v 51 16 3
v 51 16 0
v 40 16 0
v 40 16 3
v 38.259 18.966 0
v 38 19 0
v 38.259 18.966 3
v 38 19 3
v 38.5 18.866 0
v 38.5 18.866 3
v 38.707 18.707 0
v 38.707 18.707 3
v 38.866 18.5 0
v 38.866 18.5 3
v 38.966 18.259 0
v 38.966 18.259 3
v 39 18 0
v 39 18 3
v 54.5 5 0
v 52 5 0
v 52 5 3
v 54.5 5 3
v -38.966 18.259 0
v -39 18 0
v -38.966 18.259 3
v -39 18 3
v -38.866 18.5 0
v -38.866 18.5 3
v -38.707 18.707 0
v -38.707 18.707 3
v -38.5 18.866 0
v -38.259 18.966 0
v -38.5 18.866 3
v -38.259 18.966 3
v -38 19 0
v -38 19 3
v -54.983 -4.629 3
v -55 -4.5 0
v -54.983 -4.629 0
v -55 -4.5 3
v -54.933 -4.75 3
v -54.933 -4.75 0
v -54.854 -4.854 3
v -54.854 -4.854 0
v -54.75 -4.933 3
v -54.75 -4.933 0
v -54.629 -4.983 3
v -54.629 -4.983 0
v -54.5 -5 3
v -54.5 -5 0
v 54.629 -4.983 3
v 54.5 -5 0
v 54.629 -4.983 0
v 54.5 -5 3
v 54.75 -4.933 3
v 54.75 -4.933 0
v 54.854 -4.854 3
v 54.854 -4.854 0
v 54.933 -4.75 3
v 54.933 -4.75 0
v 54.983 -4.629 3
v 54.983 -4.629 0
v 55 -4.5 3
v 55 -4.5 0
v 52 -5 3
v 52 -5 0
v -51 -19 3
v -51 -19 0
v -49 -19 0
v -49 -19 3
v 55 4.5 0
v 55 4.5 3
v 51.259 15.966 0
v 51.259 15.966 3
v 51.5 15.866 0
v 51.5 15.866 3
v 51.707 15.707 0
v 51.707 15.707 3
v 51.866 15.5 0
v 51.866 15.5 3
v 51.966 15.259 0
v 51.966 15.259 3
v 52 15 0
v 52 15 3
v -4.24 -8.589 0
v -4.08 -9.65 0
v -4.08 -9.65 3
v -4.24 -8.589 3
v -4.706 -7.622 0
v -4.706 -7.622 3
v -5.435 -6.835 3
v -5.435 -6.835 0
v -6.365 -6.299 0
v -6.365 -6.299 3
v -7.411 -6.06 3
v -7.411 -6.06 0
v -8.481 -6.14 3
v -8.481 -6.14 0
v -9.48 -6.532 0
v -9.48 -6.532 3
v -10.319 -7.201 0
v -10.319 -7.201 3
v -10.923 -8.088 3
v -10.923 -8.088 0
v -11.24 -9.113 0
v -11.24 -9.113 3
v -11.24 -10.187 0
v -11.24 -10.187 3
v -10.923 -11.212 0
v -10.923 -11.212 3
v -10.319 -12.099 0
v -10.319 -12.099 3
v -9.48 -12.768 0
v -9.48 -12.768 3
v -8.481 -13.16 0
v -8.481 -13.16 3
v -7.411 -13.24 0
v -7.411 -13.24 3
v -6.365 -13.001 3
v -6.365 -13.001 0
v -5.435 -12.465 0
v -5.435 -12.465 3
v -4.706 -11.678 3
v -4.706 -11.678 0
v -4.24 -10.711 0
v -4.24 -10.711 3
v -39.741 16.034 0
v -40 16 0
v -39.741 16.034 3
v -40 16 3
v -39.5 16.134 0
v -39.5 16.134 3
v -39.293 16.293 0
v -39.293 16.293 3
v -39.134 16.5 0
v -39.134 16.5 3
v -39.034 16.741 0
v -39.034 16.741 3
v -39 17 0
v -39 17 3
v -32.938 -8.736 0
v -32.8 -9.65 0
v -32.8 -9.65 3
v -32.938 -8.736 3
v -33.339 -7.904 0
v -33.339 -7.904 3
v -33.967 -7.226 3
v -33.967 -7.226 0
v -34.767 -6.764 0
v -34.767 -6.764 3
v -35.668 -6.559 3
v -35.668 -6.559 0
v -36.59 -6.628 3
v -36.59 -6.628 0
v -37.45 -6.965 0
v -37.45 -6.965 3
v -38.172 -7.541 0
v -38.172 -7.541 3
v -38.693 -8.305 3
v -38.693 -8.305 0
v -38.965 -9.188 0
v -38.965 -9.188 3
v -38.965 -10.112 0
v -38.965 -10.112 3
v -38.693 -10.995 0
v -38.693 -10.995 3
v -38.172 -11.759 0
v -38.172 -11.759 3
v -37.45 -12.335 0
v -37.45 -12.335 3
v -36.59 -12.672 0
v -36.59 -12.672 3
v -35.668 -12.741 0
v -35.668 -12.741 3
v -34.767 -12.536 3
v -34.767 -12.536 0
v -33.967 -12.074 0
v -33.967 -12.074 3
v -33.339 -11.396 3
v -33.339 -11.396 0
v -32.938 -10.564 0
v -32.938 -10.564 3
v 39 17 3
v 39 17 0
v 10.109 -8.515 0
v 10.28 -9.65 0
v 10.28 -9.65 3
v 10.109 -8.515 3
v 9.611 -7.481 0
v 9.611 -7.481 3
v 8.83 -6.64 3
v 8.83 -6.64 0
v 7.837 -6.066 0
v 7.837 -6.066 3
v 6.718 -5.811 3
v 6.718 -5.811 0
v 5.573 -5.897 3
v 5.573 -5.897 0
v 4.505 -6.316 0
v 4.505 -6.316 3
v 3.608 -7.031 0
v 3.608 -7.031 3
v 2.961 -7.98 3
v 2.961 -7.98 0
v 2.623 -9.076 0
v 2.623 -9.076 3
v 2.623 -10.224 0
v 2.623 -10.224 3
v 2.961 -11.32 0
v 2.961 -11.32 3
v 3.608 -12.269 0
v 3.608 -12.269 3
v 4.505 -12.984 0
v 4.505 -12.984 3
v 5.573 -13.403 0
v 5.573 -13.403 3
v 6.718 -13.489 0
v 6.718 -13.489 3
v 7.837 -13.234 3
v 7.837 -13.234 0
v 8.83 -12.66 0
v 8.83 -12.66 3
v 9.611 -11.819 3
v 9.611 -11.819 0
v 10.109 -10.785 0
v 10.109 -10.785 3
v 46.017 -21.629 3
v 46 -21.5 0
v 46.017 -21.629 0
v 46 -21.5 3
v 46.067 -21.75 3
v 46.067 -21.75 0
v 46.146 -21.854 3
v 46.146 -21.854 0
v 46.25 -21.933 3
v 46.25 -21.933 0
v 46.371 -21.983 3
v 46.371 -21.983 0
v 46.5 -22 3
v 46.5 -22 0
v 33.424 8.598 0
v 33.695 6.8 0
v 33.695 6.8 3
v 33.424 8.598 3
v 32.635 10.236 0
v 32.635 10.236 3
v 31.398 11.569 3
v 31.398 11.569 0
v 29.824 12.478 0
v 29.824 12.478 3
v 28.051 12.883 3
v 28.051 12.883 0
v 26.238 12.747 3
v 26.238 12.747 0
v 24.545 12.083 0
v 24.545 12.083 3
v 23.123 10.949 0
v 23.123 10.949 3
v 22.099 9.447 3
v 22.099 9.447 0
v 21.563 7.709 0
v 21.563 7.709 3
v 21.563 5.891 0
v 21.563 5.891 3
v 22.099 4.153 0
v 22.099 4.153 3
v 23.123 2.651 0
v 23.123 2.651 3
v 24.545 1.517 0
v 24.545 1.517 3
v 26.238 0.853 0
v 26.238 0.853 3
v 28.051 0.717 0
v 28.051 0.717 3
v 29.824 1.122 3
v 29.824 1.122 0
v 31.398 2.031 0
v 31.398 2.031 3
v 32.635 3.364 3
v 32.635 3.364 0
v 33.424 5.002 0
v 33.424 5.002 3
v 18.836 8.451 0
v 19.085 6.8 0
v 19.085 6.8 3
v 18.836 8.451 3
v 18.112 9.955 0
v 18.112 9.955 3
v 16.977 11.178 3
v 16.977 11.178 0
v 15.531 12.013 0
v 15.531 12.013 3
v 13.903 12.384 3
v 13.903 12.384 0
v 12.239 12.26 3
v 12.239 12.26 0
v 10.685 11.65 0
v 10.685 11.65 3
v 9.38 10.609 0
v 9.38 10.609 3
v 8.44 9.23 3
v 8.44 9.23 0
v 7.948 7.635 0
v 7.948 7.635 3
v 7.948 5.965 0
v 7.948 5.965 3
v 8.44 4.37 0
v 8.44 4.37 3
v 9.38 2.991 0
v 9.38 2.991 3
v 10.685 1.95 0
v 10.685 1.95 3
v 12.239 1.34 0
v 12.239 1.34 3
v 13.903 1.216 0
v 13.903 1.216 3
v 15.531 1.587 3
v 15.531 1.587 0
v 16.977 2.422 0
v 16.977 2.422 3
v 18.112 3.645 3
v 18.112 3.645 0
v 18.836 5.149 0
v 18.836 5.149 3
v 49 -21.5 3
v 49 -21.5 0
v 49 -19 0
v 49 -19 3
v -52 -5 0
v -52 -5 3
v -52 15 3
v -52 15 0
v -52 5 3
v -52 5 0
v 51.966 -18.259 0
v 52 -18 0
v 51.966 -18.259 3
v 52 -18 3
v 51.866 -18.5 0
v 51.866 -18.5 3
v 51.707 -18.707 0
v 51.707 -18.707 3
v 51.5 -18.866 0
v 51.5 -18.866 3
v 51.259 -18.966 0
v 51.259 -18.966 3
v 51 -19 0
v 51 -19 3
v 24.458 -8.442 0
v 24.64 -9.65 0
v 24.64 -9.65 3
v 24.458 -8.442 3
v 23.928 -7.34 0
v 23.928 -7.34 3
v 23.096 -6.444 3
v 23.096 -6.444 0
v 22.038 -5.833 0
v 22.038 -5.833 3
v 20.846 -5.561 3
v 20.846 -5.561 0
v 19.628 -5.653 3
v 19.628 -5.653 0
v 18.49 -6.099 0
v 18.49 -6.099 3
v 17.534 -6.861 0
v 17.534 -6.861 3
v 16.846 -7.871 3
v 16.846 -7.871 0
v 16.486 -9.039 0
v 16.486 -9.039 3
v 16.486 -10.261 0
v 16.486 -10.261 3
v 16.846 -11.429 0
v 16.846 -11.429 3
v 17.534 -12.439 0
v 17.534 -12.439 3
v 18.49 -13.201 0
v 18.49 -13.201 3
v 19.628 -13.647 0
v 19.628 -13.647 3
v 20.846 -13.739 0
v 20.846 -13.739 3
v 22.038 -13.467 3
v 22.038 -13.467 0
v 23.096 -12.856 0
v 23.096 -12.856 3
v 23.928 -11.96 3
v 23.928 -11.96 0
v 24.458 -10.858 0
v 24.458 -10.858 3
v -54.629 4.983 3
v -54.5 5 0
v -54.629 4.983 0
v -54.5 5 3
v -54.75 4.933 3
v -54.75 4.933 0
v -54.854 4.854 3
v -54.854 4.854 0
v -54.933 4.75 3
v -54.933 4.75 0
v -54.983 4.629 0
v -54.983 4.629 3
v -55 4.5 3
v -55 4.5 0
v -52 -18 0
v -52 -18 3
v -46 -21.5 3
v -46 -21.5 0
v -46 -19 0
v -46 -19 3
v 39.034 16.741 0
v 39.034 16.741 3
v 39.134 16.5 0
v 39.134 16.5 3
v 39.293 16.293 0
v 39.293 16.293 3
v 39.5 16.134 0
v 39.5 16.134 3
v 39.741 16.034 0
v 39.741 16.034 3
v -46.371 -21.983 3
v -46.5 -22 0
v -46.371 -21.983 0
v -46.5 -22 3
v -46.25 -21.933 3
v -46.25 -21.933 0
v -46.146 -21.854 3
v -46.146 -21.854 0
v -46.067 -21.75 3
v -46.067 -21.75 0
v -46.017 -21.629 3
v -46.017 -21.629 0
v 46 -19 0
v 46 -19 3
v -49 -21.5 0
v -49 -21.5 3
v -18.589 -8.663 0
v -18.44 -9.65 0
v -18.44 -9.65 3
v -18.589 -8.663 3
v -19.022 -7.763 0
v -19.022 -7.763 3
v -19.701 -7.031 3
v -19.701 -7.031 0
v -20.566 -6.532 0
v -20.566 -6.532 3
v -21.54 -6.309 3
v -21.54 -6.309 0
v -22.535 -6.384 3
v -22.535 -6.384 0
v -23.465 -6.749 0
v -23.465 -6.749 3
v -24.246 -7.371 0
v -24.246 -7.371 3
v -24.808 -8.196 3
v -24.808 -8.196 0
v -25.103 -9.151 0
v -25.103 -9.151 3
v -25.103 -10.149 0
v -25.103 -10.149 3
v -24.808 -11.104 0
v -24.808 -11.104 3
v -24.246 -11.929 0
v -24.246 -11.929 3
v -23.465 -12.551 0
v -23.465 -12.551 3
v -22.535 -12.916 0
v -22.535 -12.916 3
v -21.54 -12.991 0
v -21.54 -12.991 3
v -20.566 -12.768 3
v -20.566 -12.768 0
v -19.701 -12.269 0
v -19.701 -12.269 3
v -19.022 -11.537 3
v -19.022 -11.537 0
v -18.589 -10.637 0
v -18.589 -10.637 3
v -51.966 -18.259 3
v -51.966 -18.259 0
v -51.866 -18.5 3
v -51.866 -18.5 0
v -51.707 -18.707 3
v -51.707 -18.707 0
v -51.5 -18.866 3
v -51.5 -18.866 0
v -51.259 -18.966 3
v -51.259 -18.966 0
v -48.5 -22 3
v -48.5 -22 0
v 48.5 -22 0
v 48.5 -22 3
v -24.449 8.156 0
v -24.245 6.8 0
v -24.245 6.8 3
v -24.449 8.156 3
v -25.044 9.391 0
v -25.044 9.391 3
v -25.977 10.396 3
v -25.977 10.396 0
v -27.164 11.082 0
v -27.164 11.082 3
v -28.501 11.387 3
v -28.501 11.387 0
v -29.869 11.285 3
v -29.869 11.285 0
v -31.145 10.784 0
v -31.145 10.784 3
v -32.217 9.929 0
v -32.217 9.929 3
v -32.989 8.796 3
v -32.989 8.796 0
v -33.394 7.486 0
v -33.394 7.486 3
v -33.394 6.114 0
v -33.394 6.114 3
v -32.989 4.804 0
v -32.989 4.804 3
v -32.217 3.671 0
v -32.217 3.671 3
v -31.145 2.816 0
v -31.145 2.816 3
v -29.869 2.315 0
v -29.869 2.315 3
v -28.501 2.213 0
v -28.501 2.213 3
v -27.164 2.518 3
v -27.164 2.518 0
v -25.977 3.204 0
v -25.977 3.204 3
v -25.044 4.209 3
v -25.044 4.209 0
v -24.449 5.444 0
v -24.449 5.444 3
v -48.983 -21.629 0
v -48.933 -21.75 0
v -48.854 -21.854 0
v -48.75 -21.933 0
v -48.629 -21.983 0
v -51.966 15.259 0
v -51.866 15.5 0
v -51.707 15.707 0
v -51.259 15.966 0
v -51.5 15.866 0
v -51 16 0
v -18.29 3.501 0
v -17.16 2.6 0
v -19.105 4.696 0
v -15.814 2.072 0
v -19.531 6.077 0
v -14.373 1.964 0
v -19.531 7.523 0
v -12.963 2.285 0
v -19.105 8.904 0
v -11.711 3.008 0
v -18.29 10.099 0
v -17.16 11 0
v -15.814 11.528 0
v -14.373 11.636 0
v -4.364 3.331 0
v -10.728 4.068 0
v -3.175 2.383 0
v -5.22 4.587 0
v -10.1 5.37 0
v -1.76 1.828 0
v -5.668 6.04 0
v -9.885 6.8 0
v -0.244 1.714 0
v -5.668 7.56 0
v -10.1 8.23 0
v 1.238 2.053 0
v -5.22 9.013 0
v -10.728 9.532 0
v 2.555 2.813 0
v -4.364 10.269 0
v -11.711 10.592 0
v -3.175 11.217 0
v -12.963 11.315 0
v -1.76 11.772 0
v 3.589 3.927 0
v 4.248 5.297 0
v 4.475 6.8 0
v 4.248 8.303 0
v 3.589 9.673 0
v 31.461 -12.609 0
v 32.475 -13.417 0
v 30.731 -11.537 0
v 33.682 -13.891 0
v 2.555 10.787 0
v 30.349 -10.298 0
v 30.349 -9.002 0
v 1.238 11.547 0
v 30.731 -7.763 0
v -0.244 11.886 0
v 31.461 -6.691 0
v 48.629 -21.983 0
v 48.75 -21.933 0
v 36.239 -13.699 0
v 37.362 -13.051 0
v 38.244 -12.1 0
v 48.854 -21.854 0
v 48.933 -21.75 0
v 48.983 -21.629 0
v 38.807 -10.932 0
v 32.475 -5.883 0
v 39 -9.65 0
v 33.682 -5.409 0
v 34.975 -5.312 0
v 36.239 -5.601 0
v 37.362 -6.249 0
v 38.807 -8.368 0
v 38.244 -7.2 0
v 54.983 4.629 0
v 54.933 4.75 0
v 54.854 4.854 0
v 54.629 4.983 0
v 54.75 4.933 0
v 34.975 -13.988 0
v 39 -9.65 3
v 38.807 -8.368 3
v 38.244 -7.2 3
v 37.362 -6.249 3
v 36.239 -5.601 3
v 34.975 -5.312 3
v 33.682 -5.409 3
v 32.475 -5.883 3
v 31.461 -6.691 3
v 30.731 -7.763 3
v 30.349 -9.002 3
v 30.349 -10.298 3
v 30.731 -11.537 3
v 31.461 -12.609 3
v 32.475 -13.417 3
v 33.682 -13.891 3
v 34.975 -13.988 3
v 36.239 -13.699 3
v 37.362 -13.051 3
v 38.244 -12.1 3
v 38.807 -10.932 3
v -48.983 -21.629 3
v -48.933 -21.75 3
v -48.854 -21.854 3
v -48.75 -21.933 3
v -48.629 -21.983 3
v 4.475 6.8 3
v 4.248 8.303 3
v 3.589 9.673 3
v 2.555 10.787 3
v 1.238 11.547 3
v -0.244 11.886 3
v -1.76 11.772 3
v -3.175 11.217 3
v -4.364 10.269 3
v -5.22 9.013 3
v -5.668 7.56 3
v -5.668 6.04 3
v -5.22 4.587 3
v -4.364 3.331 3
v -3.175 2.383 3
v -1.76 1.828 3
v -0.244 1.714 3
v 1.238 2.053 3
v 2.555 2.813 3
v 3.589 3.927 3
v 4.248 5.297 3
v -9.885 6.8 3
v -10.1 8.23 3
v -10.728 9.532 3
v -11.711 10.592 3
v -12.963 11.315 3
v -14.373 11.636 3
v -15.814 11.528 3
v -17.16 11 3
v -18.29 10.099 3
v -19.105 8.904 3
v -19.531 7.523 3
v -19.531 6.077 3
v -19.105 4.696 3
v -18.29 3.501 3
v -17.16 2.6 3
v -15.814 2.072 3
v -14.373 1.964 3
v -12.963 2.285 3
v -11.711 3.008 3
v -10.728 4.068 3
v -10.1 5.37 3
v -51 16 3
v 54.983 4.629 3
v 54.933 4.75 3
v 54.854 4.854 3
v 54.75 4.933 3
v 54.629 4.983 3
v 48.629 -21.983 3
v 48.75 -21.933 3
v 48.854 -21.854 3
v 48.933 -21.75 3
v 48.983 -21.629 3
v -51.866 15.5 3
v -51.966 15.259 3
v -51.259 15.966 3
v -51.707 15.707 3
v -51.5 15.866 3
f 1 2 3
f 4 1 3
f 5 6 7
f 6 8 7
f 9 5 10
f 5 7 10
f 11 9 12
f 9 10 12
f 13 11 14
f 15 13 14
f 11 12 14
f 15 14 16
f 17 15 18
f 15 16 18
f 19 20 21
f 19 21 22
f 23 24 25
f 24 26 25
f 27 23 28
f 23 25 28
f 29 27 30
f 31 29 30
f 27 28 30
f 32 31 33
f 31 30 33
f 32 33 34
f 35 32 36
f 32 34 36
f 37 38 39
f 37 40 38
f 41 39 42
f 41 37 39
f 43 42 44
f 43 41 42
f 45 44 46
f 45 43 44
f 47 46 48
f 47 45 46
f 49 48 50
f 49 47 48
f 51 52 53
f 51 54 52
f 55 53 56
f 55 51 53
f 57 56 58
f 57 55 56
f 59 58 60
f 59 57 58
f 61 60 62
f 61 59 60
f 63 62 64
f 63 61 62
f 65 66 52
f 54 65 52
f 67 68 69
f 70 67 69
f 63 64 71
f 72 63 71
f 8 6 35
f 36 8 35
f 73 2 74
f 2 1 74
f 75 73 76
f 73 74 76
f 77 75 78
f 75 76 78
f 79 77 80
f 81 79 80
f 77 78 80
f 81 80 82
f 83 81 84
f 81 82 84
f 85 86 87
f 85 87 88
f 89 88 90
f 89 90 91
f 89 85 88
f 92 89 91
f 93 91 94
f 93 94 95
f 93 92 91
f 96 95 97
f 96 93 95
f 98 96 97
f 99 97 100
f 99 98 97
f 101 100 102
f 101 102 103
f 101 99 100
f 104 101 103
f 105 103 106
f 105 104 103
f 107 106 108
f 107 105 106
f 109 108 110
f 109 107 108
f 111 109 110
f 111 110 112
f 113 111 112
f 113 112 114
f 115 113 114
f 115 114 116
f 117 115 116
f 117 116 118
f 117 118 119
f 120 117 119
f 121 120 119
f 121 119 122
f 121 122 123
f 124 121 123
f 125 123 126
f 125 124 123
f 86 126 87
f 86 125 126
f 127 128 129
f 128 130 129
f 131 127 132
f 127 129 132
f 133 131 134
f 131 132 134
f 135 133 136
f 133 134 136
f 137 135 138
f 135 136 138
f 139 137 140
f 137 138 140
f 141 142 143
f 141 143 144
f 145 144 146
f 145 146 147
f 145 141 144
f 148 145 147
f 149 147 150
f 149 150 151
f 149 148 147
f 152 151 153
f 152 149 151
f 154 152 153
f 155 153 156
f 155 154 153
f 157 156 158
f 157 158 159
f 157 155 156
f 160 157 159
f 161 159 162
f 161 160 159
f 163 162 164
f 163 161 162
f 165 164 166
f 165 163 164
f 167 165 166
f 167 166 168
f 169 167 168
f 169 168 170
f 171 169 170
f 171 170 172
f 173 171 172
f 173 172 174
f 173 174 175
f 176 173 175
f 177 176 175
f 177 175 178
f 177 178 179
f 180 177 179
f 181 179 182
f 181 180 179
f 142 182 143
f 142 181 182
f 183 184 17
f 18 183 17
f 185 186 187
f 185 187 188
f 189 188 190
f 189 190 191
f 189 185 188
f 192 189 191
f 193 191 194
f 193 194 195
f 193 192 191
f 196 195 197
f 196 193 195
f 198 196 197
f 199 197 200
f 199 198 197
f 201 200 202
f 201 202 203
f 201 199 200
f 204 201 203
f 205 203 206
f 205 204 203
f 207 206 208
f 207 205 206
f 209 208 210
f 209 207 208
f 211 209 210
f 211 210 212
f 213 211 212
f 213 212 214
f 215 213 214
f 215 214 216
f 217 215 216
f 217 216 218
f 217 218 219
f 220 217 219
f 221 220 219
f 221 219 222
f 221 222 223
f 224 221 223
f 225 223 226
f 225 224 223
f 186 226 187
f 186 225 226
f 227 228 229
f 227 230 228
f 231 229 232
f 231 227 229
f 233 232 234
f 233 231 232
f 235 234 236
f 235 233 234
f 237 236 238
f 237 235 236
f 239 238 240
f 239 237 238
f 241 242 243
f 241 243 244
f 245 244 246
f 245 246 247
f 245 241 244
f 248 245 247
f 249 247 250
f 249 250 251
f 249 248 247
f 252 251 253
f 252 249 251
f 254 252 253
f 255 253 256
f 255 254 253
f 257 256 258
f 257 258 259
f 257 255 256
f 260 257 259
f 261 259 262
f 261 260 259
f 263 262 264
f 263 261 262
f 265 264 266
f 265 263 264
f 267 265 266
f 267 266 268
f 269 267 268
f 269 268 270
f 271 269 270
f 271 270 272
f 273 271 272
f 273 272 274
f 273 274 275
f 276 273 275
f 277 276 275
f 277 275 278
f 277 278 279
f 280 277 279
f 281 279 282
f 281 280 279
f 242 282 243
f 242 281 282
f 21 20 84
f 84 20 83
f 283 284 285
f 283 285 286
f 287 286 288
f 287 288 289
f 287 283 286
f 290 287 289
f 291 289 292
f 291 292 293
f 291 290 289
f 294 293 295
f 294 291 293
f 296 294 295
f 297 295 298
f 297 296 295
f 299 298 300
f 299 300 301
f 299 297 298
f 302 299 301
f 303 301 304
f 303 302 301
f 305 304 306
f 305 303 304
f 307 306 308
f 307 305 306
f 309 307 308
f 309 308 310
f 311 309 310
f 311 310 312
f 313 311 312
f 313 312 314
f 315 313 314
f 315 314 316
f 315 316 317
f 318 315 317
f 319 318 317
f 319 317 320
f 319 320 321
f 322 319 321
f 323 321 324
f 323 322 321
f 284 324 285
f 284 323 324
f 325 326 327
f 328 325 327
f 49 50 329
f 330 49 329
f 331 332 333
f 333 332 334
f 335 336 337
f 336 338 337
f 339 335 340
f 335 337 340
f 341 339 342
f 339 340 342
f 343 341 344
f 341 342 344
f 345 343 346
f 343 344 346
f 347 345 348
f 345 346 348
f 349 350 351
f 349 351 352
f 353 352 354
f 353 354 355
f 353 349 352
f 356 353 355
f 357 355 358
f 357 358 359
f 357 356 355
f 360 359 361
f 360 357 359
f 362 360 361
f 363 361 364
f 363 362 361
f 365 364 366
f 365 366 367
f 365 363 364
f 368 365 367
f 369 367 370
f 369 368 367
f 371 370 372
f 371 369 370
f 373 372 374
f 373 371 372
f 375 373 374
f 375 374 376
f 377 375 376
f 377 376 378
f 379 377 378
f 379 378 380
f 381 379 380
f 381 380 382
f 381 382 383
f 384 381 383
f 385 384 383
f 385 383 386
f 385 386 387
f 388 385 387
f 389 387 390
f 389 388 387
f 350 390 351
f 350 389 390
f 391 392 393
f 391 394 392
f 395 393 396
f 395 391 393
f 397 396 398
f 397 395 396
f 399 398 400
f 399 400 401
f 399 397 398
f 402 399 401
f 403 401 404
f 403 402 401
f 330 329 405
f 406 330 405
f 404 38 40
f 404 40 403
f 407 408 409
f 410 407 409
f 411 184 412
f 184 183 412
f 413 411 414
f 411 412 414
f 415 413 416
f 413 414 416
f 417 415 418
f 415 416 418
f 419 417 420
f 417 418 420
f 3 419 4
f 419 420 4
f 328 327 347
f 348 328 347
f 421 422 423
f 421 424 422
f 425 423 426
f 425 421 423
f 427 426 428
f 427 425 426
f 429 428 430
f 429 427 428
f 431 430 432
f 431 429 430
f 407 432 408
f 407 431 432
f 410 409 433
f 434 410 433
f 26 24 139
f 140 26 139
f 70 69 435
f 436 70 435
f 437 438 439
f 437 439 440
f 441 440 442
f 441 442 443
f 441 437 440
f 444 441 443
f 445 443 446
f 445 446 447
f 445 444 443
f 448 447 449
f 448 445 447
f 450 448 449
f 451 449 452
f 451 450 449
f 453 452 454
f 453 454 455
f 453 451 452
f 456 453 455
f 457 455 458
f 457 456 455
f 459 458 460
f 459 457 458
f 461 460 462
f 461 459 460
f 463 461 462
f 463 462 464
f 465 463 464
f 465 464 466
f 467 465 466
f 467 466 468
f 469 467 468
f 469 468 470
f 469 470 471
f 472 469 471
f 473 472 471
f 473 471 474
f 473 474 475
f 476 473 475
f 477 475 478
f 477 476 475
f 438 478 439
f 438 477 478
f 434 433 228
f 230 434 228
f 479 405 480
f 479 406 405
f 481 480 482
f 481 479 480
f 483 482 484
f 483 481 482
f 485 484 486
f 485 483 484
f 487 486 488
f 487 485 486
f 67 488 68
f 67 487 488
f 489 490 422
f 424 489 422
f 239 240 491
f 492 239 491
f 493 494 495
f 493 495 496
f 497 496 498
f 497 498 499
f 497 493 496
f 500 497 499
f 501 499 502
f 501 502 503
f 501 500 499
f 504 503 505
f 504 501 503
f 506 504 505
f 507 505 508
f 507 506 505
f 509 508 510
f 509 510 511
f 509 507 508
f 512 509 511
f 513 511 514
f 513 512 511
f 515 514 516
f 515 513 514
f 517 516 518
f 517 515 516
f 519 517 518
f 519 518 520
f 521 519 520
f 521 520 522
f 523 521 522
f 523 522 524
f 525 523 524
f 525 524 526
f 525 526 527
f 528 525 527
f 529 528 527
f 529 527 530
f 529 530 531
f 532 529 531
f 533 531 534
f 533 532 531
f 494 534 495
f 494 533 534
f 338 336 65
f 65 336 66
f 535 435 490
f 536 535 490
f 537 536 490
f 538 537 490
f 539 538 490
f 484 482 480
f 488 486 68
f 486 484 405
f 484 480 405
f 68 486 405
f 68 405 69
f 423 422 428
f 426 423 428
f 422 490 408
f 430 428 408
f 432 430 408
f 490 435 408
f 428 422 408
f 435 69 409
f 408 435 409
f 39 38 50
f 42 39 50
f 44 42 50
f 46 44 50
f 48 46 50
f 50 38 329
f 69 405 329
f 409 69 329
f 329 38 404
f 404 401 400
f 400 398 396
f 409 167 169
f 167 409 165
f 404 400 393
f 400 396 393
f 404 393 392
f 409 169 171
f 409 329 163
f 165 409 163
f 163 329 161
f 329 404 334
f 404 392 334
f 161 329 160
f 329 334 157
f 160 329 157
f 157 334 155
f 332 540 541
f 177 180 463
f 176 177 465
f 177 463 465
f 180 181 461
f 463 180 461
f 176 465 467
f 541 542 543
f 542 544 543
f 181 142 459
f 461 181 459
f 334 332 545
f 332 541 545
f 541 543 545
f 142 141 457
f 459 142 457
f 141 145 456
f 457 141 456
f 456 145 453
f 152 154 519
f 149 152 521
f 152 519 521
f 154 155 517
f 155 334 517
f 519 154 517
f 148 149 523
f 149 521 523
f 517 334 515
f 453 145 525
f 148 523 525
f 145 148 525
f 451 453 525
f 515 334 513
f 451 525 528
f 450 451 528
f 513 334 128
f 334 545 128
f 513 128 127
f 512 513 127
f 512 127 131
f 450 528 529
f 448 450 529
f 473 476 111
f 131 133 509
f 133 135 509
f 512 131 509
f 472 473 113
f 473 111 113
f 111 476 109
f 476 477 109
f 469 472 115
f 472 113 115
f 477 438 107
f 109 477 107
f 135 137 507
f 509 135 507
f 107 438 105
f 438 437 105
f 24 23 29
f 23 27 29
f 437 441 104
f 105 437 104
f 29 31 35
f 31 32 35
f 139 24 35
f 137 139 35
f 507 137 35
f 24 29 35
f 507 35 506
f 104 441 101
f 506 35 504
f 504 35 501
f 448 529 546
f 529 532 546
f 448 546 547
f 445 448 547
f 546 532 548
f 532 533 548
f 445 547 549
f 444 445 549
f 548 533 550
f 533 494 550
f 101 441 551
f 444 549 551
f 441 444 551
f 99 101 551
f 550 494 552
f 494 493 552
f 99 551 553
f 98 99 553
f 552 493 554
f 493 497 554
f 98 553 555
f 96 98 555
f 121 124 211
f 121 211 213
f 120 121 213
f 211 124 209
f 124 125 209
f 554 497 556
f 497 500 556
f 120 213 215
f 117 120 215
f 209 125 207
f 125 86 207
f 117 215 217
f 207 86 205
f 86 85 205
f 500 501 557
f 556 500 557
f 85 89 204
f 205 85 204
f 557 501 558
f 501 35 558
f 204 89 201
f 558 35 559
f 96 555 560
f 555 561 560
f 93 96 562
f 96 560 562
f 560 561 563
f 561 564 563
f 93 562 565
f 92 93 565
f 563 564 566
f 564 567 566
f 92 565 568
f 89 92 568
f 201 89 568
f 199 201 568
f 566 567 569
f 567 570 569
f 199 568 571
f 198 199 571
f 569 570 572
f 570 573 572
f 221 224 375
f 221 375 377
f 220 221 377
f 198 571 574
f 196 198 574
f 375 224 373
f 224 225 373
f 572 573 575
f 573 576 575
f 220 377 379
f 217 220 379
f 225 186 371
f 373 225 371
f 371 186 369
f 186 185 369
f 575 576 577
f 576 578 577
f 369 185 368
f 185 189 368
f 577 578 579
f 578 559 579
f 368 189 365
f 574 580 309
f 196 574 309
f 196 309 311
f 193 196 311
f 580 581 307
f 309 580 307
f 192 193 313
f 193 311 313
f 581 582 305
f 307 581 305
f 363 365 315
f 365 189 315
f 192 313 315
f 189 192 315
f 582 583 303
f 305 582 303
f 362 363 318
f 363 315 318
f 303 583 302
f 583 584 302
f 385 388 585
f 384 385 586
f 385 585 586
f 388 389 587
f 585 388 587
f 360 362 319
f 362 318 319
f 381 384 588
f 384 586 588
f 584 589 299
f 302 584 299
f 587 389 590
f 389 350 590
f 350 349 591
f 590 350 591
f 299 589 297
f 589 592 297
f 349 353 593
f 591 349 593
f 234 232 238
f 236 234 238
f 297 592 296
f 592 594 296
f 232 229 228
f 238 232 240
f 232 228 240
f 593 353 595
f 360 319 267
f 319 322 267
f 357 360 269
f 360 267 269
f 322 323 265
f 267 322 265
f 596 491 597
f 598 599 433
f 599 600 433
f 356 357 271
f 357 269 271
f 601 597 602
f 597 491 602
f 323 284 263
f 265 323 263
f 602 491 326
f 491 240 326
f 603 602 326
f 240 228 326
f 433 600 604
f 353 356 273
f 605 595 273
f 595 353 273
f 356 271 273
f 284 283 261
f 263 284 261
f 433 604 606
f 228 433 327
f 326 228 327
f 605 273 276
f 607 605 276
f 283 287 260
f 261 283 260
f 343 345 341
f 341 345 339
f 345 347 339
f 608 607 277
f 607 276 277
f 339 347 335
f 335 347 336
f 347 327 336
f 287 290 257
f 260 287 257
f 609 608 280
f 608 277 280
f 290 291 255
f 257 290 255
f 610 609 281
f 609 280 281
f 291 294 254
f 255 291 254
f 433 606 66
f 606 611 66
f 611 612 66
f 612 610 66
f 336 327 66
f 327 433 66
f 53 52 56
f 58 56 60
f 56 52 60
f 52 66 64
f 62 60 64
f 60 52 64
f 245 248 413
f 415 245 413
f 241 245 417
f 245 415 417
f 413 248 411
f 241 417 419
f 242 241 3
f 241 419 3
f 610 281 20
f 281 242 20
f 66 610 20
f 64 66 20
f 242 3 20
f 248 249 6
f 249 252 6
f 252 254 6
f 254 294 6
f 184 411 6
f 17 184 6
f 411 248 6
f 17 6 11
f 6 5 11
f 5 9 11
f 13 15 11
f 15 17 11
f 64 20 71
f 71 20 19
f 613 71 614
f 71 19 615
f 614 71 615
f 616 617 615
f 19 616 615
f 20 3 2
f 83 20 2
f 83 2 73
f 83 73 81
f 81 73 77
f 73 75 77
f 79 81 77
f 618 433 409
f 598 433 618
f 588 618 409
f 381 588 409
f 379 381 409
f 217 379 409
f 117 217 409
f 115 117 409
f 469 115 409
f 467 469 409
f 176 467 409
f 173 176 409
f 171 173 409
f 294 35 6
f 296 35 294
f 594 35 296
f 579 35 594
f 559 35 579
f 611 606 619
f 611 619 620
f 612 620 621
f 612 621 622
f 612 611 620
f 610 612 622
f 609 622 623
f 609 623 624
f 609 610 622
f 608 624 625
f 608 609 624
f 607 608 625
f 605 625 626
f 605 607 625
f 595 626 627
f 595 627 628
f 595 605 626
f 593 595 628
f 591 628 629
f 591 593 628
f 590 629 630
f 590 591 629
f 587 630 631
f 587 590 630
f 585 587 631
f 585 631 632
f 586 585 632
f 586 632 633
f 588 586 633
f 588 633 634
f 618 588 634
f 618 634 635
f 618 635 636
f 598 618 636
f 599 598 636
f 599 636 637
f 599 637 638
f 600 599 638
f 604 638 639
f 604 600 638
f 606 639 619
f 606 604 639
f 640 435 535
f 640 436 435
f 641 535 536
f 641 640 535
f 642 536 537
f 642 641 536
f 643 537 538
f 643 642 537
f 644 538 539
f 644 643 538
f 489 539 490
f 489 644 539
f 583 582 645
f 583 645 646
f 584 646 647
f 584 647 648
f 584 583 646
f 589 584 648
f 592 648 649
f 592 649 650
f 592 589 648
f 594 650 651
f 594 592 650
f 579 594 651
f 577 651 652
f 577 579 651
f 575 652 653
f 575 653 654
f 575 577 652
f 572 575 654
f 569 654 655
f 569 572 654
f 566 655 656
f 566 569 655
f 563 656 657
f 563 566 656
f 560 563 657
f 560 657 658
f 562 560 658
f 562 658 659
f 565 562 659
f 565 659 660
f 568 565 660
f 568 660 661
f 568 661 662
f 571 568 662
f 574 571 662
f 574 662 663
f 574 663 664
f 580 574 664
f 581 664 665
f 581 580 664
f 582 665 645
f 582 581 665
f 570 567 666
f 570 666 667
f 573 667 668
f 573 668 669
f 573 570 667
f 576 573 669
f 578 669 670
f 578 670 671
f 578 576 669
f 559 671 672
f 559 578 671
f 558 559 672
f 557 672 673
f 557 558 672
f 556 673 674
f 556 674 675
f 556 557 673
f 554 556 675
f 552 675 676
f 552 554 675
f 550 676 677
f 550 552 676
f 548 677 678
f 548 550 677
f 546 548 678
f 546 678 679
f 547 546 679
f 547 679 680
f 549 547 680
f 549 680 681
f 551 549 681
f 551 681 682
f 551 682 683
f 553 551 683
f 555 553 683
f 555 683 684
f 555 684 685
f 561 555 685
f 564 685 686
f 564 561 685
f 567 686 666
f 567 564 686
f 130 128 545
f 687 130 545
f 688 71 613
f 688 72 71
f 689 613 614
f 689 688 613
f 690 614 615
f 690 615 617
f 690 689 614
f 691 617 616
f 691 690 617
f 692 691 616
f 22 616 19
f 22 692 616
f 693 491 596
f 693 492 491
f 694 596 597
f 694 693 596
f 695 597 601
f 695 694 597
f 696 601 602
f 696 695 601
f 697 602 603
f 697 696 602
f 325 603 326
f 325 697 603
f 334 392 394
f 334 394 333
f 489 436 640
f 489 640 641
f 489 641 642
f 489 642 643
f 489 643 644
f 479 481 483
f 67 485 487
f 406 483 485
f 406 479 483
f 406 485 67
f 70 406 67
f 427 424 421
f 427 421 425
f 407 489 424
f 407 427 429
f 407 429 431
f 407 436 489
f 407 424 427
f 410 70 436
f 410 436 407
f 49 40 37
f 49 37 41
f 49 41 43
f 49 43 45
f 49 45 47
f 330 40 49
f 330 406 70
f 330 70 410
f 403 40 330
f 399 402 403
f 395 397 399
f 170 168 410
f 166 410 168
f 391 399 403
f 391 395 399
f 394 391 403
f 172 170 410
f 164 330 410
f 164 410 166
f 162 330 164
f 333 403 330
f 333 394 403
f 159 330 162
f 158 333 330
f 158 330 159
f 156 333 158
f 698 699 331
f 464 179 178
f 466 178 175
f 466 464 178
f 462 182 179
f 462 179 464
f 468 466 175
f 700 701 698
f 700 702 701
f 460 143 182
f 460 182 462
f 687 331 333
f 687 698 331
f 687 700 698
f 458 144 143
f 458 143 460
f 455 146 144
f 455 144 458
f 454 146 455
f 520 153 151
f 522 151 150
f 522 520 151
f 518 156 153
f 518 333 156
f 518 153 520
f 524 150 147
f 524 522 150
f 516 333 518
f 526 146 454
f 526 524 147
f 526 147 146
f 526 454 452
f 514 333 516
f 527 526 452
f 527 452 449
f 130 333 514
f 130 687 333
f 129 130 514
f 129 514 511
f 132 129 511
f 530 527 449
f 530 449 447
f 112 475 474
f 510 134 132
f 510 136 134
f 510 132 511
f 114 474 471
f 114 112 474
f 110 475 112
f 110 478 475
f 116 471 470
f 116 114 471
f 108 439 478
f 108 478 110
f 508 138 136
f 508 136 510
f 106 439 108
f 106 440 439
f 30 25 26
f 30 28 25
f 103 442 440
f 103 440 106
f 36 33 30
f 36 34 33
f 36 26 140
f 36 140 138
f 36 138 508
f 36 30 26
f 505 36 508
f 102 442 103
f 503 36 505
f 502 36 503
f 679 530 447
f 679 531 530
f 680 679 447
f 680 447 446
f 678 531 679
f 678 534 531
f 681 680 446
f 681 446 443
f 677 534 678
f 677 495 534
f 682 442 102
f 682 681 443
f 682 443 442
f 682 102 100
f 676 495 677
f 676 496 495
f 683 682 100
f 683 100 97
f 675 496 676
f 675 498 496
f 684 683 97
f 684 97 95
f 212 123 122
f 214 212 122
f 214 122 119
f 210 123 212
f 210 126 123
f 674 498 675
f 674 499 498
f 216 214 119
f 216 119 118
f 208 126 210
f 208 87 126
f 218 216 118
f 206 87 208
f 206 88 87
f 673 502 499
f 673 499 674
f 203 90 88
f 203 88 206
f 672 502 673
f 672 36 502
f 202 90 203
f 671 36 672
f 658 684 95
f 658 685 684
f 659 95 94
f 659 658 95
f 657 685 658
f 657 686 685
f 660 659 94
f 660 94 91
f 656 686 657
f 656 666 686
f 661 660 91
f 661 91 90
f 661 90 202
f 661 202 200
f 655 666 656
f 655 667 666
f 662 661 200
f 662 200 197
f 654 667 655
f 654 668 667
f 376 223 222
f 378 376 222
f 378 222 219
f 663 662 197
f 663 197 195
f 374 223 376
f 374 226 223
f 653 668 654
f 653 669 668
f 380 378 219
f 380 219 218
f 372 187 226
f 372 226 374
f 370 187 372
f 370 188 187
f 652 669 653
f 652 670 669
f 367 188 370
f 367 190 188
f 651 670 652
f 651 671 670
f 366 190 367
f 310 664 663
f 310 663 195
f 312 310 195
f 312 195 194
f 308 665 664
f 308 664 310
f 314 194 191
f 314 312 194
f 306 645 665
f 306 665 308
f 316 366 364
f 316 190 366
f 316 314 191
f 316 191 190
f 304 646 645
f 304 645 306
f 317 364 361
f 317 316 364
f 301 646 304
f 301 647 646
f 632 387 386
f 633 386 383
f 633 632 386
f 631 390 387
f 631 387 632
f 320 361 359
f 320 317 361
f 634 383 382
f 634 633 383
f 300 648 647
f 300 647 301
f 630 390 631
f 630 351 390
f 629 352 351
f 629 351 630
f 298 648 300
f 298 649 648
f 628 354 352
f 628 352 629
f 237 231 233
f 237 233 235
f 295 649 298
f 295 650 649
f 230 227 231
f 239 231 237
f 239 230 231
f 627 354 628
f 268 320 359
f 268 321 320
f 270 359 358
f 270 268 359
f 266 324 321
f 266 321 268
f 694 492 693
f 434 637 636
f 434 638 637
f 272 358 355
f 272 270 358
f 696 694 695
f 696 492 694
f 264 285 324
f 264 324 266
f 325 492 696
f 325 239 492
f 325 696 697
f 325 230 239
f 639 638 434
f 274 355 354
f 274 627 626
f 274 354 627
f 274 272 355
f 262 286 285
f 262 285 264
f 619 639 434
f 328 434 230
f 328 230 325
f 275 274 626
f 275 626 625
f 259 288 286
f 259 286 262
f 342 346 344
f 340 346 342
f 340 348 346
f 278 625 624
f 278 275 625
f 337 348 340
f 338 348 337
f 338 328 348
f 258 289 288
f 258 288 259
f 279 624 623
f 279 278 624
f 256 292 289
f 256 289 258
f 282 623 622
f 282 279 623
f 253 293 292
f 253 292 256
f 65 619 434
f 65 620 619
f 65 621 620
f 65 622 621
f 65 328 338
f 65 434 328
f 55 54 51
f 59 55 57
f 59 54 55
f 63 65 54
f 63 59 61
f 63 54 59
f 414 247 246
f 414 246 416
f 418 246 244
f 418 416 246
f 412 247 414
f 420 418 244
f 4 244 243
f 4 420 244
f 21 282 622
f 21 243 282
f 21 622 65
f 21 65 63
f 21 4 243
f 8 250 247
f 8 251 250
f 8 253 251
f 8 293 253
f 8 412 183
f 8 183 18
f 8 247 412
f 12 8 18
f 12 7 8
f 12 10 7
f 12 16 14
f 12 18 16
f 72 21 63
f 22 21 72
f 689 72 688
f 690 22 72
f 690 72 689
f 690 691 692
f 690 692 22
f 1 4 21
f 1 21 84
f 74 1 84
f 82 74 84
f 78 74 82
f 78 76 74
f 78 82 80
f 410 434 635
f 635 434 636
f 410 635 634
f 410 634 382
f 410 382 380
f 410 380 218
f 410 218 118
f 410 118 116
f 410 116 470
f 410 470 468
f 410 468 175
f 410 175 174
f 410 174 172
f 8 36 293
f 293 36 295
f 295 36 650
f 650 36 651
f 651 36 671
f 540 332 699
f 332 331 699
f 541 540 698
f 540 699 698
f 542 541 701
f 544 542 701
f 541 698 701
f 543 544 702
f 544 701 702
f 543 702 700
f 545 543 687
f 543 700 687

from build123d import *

# Parameters (mm, degrees)
SKETCH_1_R      = 3.1
SKETCH_1_R_2    = 3.35
SKETCH_1_R_3    = 3.6
SKETCH_1_R_4    = 3.85
SKETCH_1_R_5    = 4.1
SKETCH_1_R_6    = 4.35
SKETCH_1_R_7    = 4.6
SKETCH_1_R_8    = 4.85
SKETCH_1_R_9    = 5.1
SKETCH_1_R_10   = 5.6
SKETCH_1_R_11   = 6.1
SKETCH_1_W      = 3
SKETCH_1_H      = 10
EXTRUDE_1_DEPTH = 3
FILLET_1_R      = 0.5
FILLET_2_R      = 1


with BuildPart() as part:
    # Эскиз1 → Бобышка-Вытянуть1 (new body)
    with BuildSketch(Plane.XY):
        Polygon((39, 19), (-39, 19), (-39, 16), (-52, 16), (-52, 5), (-52, -5), (-52, -19), (-49, -19), (-49, -22), (-46, -22), (-46, -19), (0, -19), (46, -19), (46, -22), (49, -22), (49, -19), (52, -19), (52, -5), (52, 5), (52, 16), (39, 16), align=None)
        with Locations((-35.9, -9.65)):
            Circle(SKETCH_1_R, mode=Mode.SUBTRACT)
        with Locations((-21.79, -9.65)):
            Circle(SKETCH_1_R_2, mode=Mode.SUBTRACT)
        with Locations((-7.68, -9.65)):
            Circle(SKETCH_1_R_3, mode=Mode.SUBTRACT)
        with Locations((6.43, -9.65)):
            Circle(SKETCH_1_R_4, mode=Mode.SUBTRACT)
        with Locations((20.54, -9.65)):
            Circle(SKETCH_1_R_5, mode=Mode.SUBTRACT)
        with Locations((34.65, -9.65)):
            Circle(SKETCH_1_R_6, mode=Mode.SUBTRACT)
        with Locations((-28.845, 6.8)):
            Circle(SKETCH_1_R_7, mode=Mode.SUBTRACT)
        with Locations((-14.735, 6.8)):
            Circle(SKETCH_1_R_8, mode=Mode.SUBTRACT)
        with Locations((-0.625, 6.8)):
            Circle(SKETCH_1_R_9, mode=Mode.SUBTRACT)
        with Locations((13.485, 6.8)):
            Circle(SKETCH_1_R_10, mode=Mode.SUBTRACT)
        with Locations((27.595, 6.8)):
            Circle(SKETCH_1_R_11, mode=Mode.SUBTRACT)
        with Locations((-53.5, 0)):
            Rectangle(SKETCH_1_W, SKETCH_1_H)
        with Locations((53.5, 0)):
            Rectangle(SKETCH_1_W, SKETCH_1_H)
    extrude(amount=EXTRUDE_1_DEPTH)

    # Скругление1
    fillet_1_edges = [part.edges().sort_by_distance(p)[0] for p in [
        (-55, -5, 1.5),
        (-55, 5, 1.5),
        (55, 5, 1.5),
        (55, -5, 1.5),
        (49, -22, 1.5),
        (46, -22, 1.5),
        (-46, -22, 1.5),
        (-49, -22, 1.5),
    ]]
    fillet(fillet_1_edges, radius=FILLET_1_R)

    # Скругление2
    fillet_2_edges = [part.edges().sort_by_distance(p)[0] for p in [
        (-52, -19, 1.5),
        (-52, 16, 1.5),
        (-39, 16, 1.5),
        (-39, 19, 1.5),
        (39, 19, 1.5),
        (39, 16, 1.5),
        (52, 16, 1.5),
        (52, -19, 1.5),
    ]]
    fillet(fillet_2_edges, radius=FILLET_2_R)


solid = part.part
